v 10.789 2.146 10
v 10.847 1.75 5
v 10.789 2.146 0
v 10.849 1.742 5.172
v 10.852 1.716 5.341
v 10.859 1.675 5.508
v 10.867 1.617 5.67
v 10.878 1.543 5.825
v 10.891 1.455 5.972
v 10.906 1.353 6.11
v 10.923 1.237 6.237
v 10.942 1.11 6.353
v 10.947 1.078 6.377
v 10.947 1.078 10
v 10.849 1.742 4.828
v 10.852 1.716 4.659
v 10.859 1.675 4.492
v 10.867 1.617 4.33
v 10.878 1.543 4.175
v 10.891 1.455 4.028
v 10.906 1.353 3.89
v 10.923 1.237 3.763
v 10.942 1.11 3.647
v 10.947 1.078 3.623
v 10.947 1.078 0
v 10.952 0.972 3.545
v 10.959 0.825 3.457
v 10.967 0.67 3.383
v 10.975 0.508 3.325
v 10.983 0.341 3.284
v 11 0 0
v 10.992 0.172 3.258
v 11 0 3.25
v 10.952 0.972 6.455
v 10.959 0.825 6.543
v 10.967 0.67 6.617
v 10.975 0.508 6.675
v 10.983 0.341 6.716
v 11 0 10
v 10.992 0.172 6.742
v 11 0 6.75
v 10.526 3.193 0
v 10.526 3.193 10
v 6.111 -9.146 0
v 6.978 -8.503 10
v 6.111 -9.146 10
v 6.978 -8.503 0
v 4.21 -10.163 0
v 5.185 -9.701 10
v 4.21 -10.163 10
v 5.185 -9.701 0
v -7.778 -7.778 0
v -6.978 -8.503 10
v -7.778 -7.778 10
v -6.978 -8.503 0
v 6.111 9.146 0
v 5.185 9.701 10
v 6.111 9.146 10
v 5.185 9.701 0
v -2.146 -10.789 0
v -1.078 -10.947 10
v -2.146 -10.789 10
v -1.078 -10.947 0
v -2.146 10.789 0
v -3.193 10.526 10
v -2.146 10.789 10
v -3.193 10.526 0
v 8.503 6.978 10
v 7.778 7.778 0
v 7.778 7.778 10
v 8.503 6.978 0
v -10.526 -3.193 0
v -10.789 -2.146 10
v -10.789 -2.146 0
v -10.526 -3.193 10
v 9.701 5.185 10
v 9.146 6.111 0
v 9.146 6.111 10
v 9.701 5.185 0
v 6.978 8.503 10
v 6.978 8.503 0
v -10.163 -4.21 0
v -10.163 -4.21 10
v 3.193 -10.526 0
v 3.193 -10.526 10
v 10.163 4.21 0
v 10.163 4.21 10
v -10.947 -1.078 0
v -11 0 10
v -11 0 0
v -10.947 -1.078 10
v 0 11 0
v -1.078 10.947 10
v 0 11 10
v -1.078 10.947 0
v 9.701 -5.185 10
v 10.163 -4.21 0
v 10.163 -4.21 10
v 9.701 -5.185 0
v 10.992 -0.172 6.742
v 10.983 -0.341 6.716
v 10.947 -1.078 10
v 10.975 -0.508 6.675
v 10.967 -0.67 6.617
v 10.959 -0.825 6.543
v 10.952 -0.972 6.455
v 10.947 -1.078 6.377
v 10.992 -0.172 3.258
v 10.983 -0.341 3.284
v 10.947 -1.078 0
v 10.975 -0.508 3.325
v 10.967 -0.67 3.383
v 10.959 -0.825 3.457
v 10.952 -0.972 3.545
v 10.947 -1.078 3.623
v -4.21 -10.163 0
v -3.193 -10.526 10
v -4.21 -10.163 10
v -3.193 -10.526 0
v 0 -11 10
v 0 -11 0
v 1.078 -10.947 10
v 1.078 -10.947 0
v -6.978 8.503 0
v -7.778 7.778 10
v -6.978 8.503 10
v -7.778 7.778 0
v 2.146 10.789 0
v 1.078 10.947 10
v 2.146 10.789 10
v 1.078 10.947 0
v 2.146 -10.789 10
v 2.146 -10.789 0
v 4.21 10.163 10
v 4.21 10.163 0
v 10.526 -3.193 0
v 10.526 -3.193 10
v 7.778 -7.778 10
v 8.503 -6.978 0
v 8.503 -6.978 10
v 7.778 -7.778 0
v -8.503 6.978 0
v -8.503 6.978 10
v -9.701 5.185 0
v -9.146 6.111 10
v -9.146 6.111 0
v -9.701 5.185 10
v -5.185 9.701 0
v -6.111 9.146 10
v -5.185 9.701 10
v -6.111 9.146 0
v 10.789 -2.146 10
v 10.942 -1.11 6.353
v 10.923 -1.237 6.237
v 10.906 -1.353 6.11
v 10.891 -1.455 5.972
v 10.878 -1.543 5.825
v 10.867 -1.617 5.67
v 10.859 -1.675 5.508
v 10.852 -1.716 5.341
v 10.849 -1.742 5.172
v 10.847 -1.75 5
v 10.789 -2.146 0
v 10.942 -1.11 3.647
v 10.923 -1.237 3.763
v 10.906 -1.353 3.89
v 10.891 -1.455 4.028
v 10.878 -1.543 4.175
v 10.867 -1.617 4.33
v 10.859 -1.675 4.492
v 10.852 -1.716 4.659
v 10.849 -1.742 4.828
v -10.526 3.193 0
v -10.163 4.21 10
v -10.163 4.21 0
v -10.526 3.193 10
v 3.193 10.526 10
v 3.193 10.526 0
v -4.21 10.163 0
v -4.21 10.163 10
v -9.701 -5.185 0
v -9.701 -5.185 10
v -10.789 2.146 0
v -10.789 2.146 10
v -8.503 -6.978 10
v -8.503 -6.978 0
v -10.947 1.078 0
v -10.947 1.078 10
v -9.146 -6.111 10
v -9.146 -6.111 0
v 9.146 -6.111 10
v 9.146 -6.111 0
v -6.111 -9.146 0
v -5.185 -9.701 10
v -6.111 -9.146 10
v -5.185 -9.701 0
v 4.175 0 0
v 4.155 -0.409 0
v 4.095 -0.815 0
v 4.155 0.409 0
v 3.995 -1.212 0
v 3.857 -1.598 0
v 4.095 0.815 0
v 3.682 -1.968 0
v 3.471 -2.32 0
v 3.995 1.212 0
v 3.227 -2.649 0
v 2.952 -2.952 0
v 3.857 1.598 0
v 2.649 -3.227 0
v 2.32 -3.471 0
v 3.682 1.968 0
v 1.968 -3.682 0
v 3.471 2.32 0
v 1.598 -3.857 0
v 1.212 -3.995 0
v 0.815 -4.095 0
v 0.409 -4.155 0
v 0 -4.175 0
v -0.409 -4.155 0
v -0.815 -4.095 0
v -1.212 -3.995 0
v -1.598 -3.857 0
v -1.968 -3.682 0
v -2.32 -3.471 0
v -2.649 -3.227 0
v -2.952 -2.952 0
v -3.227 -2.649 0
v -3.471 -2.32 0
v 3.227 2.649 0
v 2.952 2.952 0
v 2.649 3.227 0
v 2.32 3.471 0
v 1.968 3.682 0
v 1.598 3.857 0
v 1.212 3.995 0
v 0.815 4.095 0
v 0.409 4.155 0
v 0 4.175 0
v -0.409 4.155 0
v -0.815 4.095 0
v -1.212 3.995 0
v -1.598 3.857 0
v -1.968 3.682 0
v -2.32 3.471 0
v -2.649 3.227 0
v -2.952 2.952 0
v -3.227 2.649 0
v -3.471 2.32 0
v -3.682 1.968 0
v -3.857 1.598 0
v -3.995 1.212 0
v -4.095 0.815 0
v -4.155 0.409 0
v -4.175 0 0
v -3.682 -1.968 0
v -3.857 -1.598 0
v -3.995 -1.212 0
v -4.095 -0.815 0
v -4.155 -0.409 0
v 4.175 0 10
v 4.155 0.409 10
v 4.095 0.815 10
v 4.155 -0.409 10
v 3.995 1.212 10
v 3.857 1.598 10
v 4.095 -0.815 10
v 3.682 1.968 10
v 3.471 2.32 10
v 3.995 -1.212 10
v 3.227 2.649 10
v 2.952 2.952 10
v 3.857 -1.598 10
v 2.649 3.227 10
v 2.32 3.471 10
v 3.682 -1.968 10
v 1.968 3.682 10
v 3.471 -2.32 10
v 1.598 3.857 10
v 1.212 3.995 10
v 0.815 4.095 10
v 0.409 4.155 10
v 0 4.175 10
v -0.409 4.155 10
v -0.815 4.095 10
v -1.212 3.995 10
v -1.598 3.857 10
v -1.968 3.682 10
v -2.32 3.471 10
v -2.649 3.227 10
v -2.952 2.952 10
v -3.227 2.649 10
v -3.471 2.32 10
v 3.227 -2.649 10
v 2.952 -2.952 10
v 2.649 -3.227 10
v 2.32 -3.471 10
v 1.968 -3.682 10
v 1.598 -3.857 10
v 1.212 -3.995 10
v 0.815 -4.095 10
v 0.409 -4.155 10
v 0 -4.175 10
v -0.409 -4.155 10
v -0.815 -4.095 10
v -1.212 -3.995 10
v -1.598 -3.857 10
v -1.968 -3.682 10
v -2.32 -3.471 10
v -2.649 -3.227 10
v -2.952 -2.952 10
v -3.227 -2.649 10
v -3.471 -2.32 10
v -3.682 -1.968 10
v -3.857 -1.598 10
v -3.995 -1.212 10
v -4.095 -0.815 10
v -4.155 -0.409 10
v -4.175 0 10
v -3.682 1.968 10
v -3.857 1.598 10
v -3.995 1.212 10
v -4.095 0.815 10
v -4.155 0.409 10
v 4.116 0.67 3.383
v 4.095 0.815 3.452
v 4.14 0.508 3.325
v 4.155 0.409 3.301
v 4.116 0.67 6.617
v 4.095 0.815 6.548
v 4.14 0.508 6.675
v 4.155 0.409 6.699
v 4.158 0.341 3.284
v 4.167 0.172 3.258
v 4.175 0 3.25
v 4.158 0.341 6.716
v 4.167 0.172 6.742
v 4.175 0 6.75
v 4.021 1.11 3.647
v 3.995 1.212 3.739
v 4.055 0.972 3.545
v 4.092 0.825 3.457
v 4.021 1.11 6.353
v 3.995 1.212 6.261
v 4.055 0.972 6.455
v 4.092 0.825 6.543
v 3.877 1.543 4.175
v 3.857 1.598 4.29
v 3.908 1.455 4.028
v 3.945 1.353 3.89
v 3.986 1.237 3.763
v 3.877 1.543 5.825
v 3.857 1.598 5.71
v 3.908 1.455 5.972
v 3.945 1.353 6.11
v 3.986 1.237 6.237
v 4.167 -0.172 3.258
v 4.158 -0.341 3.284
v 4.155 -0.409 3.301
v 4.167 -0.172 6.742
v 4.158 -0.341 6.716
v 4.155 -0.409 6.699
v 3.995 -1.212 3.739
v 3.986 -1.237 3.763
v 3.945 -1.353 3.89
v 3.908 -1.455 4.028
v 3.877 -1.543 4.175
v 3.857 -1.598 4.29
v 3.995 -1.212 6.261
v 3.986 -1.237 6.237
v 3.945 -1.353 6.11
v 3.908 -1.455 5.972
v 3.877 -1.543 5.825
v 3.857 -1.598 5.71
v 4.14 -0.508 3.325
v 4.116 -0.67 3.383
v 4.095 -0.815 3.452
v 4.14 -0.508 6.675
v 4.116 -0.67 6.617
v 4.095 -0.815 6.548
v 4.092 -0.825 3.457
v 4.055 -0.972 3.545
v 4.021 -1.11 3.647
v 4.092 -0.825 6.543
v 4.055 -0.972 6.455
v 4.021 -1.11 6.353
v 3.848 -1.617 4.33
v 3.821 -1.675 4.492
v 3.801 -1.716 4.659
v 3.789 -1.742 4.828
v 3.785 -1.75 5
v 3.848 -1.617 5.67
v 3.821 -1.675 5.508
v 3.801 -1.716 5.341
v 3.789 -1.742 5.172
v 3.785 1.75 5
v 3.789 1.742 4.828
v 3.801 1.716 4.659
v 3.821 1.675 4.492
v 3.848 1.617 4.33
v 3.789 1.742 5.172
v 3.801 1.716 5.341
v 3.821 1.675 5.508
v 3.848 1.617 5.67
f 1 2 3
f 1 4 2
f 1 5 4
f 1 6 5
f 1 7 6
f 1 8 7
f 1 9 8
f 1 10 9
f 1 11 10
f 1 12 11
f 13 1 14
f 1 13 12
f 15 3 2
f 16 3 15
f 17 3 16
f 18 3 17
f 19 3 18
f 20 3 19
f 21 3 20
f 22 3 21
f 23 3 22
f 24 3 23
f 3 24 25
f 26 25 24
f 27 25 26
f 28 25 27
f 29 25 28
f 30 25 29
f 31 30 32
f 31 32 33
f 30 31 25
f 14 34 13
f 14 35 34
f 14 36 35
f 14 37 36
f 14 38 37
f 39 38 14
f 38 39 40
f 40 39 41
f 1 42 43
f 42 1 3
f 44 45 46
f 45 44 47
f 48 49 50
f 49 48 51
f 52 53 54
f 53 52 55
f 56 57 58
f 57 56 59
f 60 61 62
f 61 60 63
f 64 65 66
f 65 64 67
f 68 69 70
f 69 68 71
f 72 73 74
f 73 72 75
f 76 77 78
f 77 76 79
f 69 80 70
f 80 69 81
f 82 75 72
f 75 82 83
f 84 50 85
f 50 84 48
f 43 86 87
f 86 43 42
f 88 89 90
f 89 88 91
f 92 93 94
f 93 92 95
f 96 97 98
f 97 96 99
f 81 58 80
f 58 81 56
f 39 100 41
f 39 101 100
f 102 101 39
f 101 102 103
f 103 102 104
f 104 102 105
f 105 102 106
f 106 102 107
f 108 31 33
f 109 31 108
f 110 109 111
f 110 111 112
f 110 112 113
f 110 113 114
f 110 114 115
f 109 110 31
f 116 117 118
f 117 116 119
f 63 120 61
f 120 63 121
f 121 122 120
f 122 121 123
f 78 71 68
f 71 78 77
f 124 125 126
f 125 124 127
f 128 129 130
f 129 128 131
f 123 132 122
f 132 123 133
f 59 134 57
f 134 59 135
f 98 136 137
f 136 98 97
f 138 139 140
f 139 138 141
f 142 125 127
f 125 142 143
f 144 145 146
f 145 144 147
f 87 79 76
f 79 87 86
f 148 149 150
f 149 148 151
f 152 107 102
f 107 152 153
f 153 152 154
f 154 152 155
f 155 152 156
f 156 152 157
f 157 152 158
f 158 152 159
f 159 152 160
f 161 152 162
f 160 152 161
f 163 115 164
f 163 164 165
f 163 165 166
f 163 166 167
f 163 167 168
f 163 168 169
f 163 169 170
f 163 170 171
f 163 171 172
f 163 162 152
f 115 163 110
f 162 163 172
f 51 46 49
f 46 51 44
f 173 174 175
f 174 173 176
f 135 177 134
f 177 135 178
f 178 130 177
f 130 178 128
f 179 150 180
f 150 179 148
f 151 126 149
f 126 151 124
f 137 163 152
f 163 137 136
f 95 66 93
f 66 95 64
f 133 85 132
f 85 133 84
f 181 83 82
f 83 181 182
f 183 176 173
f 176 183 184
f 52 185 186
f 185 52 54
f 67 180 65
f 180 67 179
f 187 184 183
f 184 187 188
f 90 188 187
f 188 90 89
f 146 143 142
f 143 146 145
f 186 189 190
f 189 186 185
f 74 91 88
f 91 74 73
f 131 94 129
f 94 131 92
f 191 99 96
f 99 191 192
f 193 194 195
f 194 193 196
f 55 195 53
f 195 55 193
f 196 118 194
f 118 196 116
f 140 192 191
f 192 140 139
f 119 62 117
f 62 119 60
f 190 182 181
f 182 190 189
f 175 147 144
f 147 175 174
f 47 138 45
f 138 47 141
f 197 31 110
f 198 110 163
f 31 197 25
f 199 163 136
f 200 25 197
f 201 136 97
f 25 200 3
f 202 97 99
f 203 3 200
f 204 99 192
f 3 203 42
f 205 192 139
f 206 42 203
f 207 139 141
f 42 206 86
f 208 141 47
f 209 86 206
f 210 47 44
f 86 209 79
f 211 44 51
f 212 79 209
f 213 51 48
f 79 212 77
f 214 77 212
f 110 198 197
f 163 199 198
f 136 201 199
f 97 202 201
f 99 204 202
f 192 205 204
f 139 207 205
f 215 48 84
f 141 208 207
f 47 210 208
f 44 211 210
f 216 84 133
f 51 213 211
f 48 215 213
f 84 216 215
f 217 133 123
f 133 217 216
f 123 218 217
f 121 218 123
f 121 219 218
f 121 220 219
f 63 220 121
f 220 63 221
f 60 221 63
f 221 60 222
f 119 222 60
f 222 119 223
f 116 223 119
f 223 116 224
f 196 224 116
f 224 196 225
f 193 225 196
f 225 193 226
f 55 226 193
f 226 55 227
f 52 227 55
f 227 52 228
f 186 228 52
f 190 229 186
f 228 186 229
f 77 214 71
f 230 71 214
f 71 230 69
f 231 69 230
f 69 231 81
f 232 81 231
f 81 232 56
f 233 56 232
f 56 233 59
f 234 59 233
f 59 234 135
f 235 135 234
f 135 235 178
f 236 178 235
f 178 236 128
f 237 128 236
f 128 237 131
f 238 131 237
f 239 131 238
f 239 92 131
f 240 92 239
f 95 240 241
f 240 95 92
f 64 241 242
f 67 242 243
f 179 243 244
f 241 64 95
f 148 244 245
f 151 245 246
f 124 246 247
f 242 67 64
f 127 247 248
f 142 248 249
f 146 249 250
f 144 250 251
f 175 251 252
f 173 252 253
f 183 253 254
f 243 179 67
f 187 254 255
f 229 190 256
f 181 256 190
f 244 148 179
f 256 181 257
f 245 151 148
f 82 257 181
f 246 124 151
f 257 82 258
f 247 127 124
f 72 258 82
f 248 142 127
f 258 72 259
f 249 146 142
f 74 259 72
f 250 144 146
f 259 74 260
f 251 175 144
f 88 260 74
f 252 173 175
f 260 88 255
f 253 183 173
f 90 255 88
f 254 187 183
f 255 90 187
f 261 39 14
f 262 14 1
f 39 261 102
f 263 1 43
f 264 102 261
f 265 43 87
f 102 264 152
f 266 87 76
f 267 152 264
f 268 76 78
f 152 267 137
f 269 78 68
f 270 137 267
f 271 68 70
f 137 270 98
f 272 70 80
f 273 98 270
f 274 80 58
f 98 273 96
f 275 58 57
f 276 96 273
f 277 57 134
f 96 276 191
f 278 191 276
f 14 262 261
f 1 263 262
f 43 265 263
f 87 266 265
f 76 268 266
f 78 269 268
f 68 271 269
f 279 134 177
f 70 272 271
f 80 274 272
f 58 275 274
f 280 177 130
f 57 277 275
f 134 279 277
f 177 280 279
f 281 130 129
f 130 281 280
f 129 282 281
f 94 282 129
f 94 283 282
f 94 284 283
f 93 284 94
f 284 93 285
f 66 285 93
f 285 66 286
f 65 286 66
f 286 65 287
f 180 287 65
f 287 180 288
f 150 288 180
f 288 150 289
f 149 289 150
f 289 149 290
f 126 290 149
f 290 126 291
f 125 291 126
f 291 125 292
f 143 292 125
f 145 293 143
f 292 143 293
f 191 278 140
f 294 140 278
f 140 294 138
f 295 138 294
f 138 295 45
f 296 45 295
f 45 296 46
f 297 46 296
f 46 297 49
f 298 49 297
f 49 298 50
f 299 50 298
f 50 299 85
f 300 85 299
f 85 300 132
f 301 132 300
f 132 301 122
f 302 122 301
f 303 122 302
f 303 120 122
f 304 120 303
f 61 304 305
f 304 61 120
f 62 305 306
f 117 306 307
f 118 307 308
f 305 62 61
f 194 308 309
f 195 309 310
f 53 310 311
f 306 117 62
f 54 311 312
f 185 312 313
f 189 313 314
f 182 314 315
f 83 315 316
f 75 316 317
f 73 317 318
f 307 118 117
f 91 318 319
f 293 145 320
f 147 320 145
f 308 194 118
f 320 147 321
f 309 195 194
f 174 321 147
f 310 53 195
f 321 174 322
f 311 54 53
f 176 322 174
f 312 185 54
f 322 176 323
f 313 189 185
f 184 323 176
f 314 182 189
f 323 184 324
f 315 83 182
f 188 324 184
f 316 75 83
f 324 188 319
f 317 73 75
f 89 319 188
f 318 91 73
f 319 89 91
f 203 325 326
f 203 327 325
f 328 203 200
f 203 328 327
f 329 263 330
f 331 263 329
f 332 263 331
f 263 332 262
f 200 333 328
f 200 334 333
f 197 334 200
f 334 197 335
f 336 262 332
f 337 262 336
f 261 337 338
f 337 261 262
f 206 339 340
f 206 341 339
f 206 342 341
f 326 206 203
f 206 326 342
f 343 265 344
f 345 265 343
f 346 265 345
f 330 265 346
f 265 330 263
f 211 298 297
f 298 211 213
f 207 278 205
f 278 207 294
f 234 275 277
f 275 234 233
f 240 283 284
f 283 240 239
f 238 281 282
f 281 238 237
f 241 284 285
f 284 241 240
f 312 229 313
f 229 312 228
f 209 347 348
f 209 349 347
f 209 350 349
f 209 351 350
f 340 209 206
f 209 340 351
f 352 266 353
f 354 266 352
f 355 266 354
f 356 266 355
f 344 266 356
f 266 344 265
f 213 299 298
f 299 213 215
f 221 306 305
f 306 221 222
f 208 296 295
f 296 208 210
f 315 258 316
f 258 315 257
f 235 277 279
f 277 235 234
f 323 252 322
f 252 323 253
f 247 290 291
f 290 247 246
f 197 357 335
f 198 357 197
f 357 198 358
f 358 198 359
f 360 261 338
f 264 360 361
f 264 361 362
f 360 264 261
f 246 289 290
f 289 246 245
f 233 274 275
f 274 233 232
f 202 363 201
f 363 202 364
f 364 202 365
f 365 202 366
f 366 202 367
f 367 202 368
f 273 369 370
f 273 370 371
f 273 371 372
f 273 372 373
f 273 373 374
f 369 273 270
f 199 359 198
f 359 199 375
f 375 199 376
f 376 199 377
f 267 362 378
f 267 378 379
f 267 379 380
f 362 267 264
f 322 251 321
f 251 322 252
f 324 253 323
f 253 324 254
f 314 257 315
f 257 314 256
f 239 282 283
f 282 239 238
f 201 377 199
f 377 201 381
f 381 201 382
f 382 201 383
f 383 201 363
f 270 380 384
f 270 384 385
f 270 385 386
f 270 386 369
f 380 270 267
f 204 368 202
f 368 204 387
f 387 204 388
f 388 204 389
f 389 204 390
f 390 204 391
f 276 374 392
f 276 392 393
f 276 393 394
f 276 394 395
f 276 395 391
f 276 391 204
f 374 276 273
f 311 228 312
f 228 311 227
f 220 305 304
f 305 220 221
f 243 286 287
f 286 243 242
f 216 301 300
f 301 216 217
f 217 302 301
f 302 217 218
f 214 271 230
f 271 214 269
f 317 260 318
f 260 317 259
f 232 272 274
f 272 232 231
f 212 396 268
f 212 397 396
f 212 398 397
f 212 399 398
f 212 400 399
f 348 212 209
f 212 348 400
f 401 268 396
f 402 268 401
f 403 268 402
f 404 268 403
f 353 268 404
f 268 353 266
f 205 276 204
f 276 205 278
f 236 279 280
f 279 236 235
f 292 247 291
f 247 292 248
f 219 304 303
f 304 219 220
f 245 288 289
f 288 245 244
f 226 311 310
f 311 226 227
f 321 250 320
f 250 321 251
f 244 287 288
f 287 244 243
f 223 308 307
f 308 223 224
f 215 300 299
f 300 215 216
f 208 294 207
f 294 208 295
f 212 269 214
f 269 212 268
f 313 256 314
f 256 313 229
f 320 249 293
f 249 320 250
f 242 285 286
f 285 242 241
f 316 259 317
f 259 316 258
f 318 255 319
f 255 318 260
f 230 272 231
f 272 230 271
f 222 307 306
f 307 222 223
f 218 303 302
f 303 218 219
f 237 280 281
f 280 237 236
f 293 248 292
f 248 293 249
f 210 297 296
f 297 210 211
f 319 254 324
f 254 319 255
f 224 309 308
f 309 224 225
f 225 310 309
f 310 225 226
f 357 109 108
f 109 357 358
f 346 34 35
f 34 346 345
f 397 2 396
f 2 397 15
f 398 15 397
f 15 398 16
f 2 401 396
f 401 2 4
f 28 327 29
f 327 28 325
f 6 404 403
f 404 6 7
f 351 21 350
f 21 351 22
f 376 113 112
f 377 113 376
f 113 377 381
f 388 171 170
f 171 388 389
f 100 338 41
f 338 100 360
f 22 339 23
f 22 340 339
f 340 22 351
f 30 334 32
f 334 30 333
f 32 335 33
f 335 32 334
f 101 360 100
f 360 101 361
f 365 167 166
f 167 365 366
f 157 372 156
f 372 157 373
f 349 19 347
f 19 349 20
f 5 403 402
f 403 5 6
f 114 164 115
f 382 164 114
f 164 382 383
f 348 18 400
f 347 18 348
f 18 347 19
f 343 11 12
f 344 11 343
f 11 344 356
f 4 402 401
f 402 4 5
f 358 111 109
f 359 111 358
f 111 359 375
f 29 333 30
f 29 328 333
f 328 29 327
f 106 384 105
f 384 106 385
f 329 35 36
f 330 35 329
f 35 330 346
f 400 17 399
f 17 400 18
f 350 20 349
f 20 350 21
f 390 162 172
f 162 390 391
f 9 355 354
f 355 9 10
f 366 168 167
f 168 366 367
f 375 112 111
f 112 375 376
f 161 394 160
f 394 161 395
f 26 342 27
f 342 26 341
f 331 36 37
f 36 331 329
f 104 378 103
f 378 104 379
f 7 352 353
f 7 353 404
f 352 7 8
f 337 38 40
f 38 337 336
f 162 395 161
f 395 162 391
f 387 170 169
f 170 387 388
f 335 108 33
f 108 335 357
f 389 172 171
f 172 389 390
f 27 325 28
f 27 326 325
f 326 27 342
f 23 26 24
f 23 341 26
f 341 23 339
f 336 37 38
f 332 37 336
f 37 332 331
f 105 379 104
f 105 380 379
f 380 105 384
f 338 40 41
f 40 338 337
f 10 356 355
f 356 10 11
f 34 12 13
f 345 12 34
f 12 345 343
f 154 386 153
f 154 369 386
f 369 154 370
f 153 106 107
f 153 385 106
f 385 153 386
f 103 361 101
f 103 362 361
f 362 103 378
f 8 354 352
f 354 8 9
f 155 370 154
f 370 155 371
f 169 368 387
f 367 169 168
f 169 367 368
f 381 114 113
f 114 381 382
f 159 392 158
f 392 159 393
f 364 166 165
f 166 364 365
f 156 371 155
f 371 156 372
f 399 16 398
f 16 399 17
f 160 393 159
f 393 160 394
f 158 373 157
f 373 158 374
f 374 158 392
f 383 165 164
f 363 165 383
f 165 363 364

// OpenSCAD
od=22; id=8.35; h=10; set_d=3.5; $fn=64;
difference() {
    cylinder(d=od, h=h);
    translate([0,0,-0.1]) cylinder(d=id, h=h+0.2);
    translate([0,0,h/2]) rotate([0,90,0]) cylinder(d=set_d, h=od);
}
